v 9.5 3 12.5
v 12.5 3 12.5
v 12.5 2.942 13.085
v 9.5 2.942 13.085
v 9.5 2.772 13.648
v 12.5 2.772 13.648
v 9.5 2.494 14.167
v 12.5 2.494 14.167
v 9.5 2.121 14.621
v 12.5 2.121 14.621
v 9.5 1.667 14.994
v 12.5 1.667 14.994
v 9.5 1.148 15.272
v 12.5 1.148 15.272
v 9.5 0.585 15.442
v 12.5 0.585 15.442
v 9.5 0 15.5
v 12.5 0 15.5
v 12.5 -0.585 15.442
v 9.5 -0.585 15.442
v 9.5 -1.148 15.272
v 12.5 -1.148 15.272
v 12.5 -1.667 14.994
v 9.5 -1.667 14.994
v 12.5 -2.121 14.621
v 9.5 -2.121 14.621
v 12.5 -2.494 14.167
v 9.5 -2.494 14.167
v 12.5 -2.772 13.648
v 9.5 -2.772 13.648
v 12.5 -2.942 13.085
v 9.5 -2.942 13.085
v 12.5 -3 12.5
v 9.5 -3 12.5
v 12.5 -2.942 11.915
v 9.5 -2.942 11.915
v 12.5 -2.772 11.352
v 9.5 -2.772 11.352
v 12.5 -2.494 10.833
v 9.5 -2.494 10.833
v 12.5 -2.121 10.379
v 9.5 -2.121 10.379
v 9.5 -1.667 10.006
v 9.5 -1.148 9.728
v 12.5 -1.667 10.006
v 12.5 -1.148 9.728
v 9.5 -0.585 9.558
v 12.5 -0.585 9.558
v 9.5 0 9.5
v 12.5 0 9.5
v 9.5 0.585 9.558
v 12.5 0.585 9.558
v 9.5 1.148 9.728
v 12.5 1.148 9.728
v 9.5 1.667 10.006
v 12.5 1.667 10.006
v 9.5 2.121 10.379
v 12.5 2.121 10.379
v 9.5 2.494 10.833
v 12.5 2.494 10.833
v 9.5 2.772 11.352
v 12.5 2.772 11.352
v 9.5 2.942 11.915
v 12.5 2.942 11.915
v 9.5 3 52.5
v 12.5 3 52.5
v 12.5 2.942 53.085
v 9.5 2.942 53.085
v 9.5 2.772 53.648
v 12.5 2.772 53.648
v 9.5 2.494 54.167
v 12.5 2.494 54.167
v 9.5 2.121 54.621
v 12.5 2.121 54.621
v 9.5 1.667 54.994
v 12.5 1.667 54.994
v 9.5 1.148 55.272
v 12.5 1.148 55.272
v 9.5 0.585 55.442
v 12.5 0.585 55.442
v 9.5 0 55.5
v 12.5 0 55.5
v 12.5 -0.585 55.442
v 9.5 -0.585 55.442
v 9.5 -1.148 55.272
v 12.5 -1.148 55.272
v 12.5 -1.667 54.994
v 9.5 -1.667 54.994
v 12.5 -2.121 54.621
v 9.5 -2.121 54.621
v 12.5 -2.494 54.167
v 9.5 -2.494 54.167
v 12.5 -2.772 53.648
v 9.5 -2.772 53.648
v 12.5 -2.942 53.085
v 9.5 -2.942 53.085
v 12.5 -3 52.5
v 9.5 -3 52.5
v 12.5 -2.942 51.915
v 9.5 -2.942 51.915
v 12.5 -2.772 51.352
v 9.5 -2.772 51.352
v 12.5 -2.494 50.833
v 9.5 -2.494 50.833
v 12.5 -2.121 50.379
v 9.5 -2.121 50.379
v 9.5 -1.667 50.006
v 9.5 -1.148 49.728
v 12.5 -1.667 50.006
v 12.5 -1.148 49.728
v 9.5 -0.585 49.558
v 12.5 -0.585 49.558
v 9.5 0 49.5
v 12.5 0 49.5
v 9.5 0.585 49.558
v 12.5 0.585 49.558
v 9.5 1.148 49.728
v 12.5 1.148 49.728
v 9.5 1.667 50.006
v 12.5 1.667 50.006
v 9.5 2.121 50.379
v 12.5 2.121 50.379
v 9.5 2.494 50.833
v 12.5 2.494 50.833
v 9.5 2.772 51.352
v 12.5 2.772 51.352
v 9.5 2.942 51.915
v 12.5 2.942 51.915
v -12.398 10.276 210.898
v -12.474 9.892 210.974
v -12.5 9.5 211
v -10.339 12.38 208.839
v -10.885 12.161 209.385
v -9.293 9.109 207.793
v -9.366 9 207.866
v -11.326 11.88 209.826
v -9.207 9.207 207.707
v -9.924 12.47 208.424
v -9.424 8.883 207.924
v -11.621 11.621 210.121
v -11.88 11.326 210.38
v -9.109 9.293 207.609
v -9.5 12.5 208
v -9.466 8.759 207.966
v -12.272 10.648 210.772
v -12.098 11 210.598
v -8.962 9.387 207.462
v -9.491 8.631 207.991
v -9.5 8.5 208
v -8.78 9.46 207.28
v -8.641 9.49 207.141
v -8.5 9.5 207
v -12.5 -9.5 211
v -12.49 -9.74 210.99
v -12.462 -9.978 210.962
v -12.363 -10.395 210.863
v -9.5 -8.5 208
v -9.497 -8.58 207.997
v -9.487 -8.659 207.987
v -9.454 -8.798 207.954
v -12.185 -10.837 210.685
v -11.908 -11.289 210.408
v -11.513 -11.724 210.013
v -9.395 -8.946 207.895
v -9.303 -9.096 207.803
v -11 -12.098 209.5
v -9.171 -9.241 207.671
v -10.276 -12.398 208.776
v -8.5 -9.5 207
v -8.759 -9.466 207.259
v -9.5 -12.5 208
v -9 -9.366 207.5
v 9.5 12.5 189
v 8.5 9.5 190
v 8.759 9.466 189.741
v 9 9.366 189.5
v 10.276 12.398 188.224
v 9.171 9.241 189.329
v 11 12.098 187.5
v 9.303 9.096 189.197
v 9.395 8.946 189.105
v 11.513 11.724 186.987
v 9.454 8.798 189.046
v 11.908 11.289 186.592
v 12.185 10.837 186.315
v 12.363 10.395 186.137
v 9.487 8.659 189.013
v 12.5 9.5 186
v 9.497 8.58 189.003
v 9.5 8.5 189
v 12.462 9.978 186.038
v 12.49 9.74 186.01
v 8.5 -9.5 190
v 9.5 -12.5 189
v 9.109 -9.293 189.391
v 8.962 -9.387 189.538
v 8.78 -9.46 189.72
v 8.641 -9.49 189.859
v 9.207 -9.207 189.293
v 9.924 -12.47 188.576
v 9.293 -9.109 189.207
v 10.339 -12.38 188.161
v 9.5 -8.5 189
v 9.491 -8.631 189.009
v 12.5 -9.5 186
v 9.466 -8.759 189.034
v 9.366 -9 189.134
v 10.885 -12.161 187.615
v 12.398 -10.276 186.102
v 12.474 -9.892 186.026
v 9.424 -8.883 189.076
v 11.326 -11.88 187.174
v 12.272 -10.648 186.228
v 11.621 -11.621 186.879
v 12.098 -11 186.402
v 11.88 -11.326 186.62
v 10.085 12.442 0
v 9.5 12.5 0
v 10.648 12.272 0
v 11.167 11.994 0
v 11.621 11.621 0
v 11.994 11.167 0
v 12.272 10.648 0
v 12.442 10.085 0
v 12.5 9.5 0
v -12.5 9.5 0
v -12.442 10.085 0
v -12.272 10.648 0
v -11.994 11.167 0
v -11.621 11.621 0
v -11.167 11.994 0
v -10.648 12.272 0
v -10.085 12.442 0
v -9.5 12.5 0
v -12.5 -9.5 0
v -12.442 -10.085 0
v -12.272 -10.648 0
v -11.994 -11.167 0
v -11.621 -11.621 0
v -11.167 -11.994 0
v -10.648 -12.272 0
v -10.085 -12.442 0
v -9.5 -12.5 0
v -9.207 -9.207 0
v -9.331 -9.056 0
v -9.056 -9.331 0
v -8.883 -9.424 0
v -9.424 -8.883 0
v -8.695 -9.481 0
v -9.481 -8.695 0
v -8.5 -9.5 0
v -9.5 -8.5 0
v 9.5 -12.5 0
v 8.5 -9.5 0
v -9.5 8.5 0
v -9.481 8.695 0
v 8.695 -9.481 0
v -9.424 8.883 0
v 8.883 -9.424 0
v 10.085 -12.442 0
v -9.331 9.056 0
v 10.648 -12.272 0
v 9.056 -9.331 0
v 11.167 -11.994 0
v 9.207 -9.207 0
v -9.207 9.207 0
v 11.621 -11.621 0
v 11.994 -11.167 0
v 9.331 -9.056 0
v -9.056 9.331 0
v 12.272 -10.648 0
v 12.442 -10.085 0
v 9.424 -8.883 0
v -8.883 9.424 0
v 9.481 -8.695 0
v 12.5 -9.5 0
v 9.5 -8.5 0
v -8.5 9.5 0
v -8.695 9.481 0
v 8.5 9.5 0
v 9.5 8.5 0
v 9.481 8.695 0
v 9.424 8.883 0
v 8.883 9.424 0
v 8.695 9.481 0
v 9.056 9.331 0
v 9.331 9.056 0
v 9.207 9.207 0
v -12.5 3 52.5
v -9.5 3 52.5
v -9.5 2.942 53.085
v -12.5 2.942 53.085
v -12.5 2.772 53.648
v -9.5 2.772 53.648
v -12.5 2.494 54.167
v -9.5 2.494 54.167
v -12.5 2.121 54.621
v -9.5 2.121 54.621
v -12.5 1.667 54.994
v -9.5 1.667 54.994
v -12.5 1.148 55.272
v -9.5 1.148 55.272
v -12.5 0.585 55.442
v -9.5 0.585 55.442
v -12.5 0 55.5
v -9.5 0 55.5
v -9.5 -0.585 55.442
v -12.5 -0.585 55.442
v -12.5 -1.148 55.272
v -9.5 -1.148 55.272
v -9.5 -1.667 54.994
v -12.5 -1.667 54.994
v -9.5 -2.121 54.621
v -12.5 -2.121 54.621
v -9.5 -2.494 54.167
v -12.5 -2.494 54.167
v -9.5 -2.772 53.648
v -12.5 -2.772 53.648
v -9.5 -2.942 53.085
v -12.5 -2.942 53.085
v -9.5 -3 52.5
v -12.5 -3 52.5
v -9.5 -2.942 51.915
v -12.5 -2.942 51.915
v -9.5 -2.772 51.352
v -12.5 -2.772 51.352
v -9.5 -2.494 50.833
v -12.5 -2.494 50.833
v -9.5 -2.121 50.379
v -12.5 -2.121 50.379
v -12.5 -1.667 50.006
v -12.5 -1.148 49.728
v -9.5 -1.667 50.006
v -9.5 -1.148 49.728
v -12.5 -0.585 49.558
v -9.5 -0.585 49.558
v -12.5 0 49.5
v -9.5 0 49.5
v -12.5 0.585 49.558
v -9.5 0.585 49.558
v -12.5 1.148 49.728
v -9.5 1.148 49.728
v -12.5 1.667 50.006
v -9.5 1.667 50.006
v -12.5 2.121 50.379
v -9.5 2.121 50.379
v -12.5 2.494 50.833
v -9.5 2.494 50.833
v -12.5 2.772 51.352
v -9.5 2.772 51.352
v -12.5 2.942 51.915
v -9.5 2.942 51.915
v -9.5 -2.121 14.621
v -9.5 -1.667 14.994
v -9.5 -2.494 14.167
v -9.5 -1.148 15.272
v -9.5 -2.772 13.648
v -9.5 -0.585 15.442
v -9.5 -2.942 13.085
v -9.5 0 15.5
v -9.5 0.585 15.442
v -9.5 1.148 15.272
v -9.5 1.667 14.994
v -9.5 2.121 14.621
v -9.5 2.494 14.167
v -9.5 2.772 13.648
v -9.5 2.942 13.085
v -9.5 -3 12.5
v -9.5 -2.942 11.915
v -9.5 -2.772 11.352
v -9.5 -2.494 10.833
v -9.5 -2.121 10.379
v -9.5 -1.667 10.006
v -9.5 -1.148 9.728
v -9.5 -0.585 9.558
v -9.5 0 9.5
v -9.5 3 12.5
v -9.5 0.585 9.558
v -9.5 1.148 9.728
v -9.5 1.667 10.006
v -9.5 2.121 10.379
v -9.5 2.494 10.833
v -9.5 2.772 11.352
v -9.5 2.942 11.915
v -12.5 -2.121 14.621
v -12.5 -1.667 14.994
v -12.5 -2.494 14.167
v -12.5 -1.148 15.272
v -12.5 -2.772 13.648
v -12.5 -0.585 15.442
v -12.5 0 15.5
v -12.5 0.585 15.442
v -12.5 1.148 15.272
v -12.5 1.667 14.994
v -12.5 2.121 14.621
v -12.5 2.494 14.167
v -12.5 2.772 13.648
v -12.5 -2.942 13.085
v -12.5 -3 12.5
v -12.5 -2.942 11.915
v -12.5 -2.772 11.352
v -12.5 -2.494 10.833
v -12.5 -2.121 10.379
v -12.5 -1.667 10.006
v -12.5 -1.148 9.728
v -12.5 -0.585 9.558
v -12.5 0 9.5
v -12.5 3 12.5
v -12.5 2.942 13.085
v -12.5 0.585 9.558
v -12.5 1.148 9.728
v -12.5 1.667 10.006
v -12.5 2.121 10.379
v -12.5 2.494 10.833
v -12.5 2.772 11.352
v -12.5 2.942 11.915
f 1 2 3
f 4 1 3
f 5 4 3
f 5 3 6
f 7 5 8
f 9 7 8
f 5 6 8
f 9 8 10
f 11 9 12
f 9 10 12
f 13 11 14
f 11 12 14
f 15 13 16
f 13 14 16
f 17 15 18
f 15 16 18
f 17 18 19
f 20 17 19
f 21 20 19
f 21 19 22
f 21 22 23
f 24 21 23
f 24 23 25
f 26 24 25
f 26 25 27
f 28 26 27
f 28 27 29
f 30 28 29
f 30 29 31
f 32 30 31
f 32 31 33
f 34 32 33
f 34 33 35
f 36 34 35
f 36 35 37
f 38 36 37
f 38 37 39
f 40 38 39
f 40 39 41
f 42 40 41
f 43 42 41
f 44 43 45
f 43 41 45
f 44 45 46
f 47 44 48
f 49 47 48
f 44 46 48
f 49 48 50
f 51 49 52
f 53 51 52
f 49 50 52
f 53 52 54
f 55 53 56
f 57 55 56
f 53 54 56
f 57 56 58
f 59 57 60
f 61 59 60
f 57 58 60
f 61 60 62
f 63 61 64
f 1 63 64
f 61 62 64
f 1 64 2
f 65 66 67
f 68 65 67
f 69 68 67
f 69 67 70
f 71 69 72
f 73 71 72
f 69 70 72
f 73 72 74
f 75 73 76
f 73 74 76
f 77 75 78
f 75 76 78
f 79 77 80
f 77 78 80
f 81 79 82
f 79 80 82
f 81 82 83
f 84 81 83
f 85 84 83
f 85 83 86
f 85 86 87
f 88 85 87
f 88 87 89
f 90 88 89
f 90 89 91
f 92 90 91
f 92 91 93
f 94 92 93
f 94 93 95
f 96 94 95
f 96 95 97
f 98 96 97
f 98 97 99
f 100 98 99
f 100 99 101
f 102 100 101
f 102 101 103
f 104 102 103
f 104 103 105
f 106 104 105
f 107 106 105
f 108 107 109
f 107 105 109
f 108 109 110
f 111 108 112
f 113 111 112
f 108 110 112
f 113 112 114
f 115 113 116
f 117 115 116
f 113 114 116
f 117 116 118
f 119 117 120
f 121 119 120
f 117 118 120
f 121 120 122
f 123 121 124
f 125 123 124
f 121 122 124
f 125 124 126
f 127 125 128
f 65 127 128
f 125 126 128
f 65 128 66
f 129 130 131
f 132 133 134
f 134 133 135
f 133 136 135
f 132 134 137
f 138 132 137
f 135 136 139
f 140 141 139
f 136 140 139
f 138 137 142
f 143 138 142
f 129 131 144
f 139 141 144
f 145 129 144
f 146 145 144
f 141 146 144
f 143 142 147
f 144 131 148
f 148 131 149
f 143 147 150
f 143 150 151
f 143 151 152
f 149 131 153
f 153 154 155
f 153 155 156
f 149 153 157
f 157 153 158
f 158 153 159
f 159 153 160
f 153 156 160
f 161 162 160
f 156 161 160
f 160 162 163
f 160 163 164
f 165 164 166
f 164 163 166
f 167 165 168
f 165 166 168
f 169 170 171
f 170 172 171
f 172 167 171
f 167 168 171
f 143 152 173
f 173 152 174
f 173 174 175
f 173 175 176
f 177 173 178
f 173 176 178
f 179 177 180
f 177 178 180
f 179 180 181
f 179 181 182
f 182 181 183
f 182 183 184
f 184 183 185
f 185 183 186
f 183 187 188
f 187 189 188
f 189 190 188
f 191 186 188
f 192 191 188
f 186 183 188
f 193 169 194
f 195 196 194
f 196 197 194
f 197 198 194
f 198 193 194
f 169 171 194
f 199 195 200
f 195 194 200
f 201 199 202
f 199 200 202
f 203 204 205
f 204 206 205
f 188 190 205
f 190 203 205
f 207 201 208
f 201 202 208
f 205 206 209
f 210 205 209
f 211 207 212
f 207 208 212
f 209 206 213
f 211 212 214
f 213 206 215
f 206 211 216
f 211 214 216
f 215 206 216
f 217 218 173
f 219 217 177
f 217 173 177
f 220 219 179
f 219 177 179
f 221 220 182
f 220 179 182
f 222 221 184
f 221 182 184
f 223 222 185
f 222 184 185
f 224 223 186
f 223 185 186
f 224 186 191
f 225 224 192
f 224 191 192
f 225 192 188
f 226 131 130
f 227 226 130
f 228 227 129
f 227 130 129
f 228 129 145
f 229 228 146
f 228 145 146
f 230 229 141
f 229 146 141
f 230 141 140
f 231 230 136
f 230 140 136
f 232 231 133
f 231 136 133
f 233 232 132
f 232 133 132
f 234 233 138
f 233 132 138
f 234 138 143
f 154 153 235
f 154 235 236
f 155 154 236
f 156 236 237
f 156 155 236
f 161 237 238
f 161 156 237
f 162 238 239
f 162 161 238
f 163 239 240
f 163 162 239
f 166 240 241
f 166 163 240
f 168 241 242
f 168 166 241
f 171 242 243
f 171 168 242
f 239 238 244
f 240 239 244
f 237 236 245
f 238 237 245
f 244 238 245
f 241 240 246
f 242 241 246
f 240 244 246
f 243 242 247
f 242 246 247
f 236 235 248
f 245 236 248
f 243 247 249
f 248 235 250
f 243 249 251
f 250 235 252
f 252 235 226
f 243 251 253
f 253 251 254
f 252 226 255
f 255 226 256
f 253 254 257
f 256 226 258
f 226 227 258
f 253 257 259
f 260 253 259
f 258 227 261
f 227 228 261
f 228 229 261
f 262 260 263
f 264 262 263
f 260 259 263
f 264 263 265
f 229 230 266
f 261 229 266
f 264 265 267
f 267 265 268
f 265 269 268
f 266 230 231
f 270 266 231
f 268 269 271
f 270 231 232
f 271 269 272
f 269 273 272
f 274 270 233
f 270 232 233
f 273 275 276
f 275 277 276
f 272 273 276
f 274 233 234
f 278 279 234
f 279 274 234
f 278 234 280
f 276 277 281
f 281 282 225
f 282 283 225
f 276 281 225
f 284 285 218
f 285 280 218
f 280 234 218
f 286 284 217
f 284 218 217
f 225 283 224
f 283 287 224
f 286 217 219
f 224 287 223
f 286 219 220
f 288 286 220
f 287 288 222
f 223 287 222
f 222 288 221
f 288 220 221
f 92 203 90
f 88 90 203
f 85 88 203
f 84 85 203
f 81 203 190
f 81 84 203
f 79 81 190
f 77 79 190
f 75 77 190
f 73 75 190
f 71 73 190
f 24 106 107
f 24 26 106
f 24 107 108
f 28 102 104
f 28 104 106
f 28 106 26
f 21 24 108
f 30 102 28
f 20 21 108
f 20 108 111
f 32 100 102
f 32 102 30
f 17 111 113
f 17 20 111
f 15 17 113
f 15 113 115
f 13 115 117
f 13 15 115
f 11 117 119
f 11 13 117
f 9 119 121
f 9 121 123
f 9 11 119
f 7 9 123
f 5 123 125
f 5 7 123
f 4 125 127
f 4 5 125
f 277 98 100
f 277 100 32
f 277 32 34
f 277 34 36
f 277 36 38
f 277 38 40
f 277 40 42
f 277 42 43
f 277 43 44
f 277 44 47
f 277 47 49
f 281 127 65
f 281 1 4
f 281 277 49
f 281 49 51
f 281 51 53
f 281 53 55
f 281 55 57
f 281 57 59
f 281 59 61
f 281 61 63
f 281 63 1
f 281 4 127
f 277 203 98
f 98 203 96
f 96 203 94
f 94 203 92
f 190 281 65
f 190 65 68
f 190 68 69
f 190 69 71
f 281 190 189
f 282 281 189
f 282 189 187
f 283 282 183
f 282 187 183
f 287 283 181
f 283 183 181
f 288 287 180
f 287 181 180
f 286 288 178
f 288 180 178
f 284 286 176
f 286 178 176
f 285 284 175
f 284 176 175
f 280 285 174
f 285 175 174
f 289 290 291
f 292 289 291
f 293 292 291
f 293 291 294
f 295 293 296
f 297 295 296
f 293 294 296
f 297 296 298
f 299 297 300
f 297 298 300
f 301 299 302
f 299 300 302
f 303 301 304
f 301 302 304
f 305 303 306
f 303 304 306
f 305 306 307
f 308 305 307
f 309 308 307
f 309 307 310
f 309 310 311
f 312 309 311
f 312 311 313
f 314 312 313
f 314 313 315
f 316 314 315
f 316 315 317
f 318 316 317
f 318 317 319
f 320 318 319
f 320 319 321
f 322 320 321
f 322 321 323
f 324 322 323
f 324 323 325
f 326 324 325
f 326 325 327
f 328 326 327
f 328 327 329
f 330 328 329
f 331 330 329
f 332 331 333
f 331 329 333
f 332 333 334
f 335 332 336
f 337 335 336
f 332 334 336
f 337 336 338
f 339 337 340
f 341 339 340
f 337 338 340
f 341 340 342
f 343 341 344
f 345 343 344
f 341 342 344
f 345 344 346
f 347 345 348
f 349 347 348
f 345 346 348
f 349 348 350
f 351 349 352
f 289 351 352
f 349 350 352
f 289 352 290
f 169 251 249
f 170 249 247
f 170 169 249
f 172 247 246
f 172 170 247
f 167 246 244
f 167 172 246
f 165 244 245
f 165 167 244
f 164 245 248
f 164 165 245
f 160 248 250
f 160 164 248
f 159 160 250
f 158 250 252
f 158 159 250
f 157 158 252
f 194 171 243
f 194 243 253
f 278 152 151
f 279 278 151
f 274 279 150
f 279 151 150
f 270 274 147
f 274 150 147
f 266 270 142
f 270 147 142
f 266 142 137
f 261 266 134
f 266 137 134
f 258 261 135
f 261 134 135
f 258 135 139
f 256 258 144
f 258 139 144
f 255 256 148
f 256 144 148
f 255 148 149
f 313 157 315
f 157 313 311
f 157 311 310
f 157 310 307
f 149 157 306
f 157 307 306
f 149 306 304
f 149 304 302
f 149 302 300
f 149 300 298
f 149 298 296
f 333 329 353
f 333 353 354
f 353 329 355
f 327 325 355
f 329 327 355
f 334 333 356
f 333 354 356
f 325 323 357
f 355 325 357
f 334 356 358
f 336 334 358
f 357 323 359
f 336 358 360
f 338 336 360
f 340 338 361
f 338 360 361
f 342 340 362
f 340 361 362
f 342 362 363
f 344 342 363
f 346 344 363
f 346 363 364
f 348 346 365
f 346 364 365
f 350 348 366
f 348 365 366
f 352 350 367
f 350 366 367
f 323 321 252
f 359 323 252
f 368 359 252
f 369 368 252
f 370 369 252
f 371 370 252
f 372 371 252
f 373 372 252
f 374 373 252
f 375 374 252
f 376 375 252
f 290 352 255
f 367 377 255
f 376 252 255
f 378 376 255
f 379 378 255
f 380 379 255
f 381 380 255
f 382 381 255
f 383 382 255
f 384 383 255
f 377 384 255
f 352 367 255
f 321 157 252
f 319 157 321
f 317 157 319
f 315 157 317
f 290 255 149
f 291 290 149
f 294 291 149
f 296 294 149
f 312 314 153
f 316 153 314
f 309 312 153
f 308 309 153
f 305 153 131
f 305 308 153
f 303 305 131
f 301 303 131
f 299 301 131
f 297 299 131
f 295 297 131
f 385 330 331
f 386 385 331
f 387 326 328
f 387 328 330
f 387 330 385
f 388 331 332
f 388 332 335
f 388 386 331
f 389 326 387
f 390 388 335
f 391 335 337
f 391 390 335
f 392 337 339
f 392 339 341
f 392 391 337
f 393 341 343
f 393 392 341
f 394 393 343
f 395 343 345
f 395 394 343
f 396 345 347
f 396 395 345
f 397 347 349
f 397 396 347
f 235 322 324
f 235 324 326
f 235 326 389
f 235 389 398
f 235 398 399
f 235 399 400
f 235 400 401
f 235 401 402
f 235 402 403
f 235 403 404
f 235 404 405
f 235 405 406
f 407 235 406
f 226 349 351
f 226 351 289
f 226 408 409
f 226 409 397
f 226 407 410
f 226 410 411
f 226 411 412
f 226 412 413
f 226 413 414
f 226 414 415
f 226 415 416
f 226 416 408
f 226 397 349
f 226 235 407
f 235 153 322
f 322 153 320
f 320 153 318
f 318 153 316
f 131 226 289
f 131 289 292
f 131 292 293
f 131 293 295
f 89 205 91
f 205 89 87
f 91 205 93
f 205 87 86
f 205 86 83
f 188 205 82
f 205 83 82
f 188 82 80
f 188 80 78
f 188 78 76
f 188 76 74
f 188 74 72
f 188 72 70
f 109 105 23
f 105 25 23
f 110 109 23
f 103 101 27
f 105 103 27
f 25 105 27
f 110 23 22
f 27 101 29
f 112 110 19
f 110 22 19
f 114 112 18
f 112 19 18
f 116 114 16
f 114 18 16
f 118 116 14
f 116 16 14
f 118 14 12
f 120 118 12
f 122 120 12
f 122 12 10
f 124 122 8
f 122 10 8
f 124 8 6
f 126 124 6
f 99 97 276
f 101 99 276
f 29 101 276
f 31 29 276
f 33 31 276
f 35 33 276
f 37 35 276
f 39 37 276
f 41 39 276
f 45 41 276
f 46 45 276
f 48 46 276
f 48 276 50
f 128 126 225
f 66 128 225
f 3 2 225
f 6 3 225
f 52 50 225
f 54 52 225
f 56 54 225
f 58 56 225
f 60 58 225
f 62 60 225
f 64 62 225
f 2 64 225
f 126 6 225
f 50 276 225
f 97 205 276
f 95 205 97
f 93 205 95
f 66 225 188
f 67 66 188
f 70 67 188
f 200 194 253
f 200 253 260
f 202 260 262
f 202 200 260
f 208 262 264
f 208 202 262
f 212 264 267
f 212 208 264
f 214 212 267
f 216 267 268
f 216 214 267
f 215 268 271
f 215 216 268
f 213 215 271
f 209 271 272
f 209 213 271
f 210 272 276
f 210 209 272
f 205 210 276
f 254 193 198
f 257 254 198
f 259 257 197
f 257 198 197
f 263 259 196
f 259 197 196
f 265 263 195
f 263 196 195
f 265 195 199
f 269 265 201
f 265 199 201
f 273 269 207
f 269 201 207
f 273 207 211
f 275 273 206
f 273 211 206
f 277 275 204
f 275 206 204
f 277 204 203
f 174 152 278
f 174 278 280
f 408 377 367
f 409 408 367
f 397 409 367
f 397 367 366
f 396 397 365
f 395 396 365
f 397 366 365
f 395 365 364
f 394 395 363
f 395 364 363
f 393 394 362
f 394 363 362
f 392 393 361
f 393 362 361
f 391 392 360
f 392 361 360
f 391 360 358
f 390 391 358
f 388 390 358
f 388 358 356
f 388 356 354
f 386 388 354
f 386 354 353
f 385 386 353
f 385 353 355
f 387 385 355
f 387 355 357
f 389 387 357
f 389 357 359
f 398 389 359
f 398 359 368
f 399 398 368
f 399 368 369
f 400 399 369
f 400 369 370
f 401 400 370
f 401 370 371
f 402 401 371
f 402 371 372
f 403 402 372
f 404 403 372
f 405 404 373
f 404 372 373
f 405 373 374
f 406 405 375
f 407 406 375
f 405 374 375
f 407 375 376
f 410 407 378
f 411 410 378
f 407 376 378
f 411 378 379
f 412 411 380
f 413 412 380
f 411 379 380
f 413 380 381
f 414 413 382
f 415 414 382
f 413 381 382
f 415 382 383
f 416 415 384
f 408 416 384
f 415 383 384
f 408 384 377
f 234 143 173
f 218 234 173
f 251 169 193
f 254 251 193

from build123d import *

# Parameters (mm, degrees)
F0_W     = 25
F0_H     = 25
F0_W_2   = 19
F0_H_2   = 19
F1_DEPTH = 211
F2_R     = 1
F3_R     = 3
F5_DEPTH = 25.001
F7_D     = 6


with BuildPart() as f1:
    # F0 (on Top) → F1 (new body)
    with BuildSketch(Plane.XY):
        Rectangle(F0_W, F0_H)
        Rectangle(F0_W_2, F0_H_2, mode=Mode.SUBTRACT)
    extrude(amount=F1_DEPTH)

    # F2
    f2_edges = [f1.edges().sort_by_distance(p)[0] for p in [
        (-9.5, -9.5, 105.5),
        (-9.5, 9.5, 105.5),
        (9.5, 9.5, 105.5),
        (9.5, -9.5, 105.5),
    ]]
    fillet(f2_edges, radius=F2_R)

    # F3
    f3_edges = [f1.edges().sort_by_distance(p)[0] for p in [
        (-12.5, 12.5, 105.5),
        (-12.5, -12.5, 105.5),
        (12.5, 12.5, 105.5),
        (12.5, -12.5, 105.5),
    ]]
    fillet(f3_edges, radius=F3_R)

    # F4 (on face) → F5 (cut, through all)
    with BuildSketch(Plane.XZ.offset(12.5)):
        Polygon((-9.5, 211), (-9.5, 208), (9.5, 189), (9.5, 211), align=None)
        Polygon((-9.5, 211), (-12.5, 211), (-9.5, 208), align=None)
        Polygon((9.5, 211), (9.5, 189), (12.5, 186), (12.5, 211), align=None)
    extrude(amount=-F5_DEPTH, mode=Mode.SUBTRACT)

    # F7 (through all)
    with Locations(Plane(origin=(-12.5, 0, 0), x_dir=(0, -1, 0), z_dir=(-1, 0, 0))):
        with Locations((0, 12.5), (0, 52.5)):
            Hole(F7_D / 2)


solid = f1.part
